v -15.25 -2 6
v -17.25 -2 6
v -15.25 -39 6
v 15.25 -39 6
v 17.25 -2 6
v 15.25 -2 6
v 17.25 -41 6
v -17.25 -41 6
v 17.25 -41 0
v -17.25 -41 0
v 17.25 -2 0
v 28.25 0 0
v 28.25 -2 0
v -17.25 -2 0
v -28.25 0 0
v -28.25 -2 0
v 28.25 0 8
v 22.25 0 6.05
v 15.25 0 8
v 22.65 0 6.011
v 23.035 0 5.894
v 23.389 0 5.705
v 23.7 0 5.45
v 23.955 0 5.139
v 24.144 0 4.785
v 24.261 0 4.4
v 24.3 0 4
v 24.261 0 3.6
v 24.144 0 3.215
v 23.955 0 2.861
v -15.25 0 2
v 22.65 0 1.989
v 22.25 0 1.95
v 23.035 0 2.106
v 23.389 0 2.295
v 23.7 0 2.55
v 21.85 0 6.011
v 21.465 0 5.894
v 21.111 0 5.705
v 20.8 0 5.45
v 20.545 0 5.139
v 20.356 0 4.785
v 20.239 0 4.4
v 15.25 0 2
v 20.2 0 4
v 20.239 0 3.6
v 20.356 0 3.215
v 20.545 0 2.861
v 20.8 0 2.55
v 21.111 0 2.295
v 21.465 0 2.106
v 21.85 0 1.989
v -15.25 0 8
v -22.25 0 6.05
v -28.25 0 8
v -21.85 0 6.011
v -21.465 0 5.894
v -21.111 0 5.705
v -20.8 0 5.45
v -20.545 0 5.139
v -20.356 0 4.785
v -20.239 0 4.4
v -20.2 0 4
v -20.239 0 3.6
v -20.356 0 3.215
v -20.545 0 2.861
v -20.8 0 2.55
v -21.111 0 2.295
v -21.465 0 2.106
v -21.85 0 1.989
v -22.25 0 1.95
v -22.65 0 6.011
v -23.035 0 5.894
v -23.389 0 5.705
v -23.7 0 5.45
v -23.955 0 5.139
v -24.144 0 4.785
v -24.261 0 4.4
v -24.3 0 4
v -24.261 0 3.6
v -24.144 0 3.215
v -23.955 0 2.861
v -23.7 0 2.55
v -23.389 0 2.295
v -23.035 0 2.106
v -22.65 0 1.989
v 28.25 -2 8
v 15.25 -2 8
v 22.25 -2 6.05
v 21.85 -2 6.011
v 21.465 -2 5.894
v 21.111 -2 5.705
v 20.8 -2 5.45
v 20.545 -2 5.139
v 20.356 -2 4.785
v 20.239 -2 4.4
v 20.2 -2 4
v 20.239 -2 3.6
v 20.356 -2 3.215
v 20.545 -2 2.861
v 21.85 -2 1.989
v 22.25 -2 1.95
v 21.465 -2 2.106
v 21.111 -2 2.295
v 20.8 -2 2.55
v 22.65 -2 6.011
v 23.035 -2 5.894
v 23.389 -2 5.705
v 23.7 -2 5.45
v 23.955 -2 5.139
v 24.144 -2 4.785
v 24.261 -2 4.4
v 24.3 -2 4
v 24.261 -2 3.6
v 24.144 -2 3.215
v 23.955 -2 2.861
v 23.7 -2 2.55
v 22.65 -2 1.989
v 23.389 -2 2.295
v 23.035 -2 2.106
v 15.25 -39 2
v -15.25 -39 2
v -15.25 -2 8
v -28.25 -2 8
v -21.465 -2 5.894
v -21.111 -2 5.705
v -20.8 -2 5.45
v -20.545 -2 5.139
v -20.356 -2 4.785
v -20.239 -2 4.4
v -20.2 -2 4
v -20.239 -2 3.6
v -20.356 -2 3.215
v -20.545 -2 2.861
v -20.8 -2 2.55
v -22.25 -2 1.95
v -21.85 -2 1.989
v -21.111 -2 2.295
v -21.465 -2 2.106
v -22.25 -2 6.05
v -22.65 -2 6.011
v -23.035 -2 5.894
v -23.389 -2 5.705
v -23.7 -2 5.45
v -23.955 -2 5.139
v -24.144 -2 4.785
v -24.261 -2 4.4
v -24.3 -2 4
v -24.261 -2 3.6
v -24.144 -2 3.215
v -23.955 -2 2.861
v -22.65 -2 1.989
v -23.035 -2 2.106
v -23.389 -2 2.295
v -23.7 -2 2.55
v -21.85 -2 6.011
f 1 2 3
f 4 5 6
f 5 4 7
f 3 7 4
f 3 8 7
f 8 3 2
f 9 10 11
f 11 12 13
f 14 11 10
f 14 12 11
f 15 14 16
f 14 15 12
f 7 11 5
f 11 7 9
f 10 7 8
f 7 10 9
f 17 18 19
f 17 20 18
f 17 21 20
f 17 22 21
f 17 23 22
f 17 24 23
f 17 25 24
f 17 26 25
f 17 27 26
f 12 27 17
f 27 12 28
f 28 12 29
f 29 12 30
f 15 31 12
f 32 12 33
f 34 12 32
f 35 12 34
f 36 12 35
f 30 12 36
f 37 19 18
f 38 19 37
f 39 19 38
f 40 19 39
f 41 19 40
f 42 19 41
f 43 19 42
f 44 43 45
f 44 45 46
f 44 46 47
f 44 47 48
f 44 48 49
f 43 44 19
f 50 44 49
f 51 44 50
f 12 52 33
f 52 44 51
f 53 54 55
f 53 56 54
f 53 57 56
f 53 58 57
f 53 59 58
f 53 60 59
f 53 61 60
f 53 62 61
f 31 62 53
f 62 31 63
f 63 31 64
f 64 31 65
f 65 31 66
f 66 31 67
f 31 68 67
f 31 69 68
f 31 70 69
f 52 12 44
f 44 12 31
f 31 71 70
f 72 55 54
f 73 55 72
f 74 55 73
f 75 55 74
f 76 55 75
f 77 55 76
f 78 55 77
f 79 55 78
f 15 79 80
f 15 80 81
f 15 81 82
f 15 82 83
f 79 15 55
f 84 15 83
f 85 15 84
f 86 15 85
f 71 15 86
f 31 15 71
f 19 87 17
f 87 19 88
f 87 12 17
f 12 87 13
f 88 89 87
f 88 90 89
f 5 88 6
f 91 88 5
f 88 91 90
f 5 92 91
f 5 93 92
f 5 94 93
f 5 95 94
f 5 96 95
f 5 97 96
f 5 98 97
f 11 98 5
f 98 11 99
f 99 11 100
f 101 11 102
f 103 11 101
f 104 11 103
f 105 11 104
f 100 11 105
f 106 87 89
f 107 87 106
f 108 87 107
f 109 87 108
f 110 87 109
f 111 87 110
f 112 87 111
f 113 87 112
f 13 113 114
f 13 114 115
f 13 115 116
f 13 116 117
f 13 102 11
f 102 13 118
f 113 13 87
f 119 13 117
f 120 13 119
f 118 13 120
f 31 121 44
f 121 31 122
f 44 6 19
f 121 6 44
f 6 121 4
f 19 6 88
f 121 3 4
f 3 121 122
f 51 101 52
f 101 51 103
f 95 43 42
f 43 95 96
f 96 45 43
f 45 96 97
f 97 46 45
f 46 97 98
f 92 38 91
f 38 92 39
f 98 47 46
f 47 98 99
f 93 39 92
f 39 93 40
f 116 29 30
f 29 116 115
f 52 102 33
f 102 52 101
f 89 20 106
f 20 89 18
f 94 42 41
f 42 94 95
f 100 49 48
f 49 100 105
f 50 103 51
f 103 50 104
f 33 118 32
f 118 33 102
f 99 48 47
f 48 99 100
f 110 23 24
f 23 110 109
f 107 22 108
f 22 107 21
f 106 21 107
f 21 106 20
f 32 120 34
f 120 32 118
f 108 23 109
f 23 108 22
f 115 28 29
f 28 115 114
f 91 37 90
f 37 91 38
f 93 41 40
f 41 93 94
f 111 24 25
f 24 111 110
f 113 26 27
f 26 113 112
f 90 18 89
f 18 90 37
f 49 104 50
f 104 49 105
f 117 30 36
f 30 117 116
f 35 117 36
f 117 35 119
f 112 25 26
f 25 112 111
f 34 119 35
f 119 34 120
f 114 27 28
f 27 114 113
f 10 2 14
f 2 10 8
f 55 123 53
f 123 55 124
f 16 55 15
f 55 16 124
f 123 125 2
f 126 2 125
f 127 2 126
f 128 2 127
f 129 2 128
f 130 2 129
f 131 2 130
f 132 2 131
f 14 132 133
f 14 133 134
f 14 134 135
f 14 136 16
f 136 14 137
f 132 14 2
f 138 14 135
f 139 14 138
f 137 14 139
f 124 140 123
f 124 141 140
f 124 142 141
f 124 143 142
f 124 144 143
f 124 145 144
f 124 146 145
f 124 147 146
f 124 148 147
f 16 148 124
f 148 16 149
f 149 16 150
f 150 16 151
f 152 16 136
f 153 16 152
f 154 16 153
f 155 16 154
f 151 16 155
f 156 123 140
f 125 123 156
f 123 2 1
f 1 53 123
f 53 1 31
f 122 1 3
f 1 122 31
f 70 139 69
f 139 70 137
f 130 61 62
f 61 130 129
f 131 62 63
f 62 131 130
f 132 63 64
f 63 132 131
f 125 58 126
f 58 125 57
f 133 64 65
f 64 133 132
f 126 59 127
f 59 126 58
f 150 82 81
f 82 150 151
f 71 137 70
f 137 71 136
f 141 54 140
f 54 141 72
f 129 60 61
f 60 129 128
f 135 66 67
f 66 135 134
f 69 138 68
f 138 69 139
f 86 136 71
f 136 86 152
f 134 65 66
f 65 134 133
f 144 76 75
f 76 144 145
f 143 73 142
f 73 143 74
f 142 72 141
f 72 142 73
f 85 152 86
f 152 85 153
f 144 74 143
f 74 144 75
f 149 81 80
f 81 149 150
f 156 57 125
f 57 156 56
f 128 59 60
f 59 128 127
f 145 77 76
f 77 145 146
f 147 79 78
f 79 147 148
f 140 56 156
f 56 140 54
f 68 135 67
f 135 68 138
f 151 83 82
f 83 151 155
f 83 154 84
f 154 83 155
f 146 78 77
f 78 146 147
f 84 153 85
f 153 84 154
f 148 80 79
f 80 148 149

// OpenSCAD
WIDTH = 30.5 / 2;
DEPTH = 39;


module output()
{
    translate( v = [
        WIDTH + 2
        ,0
        ,0
    ]) rotate( a = [
        0
        ,0
        ,-180
    ]) difference() {
        union() {
            // Main mount
            cube( size = [
                WIDTH + 2
                ,DEPTH + 2
                ,6
            ]);

            // Vert mounting brackets
            translate( v = [
                -11
                ,0
                ,0
            ]) {
                cube( size = [
                    WIDTH + 11
                    ,2
                    ,8
                ]);
            }
        }

        // Cutout
        translate( v = [
            2
            ,-1
            ,2
        ]) {
            cube( size = [
                WIDTH + 1
                ,DEPTH + 1
                ,20
            ]);
        }

        // Screw holes
        rotate( a = [
            90
            ,0
            ,0
        ]) translate( v = [
            -5
            ,4
            ,-4
        ]) {
            cylinder(
                h = 10
                ,d = 4.1
                ,$fn = 32
            );
        }
    }
}


output();
mirror([ 1, 0, 0 ]) output();
